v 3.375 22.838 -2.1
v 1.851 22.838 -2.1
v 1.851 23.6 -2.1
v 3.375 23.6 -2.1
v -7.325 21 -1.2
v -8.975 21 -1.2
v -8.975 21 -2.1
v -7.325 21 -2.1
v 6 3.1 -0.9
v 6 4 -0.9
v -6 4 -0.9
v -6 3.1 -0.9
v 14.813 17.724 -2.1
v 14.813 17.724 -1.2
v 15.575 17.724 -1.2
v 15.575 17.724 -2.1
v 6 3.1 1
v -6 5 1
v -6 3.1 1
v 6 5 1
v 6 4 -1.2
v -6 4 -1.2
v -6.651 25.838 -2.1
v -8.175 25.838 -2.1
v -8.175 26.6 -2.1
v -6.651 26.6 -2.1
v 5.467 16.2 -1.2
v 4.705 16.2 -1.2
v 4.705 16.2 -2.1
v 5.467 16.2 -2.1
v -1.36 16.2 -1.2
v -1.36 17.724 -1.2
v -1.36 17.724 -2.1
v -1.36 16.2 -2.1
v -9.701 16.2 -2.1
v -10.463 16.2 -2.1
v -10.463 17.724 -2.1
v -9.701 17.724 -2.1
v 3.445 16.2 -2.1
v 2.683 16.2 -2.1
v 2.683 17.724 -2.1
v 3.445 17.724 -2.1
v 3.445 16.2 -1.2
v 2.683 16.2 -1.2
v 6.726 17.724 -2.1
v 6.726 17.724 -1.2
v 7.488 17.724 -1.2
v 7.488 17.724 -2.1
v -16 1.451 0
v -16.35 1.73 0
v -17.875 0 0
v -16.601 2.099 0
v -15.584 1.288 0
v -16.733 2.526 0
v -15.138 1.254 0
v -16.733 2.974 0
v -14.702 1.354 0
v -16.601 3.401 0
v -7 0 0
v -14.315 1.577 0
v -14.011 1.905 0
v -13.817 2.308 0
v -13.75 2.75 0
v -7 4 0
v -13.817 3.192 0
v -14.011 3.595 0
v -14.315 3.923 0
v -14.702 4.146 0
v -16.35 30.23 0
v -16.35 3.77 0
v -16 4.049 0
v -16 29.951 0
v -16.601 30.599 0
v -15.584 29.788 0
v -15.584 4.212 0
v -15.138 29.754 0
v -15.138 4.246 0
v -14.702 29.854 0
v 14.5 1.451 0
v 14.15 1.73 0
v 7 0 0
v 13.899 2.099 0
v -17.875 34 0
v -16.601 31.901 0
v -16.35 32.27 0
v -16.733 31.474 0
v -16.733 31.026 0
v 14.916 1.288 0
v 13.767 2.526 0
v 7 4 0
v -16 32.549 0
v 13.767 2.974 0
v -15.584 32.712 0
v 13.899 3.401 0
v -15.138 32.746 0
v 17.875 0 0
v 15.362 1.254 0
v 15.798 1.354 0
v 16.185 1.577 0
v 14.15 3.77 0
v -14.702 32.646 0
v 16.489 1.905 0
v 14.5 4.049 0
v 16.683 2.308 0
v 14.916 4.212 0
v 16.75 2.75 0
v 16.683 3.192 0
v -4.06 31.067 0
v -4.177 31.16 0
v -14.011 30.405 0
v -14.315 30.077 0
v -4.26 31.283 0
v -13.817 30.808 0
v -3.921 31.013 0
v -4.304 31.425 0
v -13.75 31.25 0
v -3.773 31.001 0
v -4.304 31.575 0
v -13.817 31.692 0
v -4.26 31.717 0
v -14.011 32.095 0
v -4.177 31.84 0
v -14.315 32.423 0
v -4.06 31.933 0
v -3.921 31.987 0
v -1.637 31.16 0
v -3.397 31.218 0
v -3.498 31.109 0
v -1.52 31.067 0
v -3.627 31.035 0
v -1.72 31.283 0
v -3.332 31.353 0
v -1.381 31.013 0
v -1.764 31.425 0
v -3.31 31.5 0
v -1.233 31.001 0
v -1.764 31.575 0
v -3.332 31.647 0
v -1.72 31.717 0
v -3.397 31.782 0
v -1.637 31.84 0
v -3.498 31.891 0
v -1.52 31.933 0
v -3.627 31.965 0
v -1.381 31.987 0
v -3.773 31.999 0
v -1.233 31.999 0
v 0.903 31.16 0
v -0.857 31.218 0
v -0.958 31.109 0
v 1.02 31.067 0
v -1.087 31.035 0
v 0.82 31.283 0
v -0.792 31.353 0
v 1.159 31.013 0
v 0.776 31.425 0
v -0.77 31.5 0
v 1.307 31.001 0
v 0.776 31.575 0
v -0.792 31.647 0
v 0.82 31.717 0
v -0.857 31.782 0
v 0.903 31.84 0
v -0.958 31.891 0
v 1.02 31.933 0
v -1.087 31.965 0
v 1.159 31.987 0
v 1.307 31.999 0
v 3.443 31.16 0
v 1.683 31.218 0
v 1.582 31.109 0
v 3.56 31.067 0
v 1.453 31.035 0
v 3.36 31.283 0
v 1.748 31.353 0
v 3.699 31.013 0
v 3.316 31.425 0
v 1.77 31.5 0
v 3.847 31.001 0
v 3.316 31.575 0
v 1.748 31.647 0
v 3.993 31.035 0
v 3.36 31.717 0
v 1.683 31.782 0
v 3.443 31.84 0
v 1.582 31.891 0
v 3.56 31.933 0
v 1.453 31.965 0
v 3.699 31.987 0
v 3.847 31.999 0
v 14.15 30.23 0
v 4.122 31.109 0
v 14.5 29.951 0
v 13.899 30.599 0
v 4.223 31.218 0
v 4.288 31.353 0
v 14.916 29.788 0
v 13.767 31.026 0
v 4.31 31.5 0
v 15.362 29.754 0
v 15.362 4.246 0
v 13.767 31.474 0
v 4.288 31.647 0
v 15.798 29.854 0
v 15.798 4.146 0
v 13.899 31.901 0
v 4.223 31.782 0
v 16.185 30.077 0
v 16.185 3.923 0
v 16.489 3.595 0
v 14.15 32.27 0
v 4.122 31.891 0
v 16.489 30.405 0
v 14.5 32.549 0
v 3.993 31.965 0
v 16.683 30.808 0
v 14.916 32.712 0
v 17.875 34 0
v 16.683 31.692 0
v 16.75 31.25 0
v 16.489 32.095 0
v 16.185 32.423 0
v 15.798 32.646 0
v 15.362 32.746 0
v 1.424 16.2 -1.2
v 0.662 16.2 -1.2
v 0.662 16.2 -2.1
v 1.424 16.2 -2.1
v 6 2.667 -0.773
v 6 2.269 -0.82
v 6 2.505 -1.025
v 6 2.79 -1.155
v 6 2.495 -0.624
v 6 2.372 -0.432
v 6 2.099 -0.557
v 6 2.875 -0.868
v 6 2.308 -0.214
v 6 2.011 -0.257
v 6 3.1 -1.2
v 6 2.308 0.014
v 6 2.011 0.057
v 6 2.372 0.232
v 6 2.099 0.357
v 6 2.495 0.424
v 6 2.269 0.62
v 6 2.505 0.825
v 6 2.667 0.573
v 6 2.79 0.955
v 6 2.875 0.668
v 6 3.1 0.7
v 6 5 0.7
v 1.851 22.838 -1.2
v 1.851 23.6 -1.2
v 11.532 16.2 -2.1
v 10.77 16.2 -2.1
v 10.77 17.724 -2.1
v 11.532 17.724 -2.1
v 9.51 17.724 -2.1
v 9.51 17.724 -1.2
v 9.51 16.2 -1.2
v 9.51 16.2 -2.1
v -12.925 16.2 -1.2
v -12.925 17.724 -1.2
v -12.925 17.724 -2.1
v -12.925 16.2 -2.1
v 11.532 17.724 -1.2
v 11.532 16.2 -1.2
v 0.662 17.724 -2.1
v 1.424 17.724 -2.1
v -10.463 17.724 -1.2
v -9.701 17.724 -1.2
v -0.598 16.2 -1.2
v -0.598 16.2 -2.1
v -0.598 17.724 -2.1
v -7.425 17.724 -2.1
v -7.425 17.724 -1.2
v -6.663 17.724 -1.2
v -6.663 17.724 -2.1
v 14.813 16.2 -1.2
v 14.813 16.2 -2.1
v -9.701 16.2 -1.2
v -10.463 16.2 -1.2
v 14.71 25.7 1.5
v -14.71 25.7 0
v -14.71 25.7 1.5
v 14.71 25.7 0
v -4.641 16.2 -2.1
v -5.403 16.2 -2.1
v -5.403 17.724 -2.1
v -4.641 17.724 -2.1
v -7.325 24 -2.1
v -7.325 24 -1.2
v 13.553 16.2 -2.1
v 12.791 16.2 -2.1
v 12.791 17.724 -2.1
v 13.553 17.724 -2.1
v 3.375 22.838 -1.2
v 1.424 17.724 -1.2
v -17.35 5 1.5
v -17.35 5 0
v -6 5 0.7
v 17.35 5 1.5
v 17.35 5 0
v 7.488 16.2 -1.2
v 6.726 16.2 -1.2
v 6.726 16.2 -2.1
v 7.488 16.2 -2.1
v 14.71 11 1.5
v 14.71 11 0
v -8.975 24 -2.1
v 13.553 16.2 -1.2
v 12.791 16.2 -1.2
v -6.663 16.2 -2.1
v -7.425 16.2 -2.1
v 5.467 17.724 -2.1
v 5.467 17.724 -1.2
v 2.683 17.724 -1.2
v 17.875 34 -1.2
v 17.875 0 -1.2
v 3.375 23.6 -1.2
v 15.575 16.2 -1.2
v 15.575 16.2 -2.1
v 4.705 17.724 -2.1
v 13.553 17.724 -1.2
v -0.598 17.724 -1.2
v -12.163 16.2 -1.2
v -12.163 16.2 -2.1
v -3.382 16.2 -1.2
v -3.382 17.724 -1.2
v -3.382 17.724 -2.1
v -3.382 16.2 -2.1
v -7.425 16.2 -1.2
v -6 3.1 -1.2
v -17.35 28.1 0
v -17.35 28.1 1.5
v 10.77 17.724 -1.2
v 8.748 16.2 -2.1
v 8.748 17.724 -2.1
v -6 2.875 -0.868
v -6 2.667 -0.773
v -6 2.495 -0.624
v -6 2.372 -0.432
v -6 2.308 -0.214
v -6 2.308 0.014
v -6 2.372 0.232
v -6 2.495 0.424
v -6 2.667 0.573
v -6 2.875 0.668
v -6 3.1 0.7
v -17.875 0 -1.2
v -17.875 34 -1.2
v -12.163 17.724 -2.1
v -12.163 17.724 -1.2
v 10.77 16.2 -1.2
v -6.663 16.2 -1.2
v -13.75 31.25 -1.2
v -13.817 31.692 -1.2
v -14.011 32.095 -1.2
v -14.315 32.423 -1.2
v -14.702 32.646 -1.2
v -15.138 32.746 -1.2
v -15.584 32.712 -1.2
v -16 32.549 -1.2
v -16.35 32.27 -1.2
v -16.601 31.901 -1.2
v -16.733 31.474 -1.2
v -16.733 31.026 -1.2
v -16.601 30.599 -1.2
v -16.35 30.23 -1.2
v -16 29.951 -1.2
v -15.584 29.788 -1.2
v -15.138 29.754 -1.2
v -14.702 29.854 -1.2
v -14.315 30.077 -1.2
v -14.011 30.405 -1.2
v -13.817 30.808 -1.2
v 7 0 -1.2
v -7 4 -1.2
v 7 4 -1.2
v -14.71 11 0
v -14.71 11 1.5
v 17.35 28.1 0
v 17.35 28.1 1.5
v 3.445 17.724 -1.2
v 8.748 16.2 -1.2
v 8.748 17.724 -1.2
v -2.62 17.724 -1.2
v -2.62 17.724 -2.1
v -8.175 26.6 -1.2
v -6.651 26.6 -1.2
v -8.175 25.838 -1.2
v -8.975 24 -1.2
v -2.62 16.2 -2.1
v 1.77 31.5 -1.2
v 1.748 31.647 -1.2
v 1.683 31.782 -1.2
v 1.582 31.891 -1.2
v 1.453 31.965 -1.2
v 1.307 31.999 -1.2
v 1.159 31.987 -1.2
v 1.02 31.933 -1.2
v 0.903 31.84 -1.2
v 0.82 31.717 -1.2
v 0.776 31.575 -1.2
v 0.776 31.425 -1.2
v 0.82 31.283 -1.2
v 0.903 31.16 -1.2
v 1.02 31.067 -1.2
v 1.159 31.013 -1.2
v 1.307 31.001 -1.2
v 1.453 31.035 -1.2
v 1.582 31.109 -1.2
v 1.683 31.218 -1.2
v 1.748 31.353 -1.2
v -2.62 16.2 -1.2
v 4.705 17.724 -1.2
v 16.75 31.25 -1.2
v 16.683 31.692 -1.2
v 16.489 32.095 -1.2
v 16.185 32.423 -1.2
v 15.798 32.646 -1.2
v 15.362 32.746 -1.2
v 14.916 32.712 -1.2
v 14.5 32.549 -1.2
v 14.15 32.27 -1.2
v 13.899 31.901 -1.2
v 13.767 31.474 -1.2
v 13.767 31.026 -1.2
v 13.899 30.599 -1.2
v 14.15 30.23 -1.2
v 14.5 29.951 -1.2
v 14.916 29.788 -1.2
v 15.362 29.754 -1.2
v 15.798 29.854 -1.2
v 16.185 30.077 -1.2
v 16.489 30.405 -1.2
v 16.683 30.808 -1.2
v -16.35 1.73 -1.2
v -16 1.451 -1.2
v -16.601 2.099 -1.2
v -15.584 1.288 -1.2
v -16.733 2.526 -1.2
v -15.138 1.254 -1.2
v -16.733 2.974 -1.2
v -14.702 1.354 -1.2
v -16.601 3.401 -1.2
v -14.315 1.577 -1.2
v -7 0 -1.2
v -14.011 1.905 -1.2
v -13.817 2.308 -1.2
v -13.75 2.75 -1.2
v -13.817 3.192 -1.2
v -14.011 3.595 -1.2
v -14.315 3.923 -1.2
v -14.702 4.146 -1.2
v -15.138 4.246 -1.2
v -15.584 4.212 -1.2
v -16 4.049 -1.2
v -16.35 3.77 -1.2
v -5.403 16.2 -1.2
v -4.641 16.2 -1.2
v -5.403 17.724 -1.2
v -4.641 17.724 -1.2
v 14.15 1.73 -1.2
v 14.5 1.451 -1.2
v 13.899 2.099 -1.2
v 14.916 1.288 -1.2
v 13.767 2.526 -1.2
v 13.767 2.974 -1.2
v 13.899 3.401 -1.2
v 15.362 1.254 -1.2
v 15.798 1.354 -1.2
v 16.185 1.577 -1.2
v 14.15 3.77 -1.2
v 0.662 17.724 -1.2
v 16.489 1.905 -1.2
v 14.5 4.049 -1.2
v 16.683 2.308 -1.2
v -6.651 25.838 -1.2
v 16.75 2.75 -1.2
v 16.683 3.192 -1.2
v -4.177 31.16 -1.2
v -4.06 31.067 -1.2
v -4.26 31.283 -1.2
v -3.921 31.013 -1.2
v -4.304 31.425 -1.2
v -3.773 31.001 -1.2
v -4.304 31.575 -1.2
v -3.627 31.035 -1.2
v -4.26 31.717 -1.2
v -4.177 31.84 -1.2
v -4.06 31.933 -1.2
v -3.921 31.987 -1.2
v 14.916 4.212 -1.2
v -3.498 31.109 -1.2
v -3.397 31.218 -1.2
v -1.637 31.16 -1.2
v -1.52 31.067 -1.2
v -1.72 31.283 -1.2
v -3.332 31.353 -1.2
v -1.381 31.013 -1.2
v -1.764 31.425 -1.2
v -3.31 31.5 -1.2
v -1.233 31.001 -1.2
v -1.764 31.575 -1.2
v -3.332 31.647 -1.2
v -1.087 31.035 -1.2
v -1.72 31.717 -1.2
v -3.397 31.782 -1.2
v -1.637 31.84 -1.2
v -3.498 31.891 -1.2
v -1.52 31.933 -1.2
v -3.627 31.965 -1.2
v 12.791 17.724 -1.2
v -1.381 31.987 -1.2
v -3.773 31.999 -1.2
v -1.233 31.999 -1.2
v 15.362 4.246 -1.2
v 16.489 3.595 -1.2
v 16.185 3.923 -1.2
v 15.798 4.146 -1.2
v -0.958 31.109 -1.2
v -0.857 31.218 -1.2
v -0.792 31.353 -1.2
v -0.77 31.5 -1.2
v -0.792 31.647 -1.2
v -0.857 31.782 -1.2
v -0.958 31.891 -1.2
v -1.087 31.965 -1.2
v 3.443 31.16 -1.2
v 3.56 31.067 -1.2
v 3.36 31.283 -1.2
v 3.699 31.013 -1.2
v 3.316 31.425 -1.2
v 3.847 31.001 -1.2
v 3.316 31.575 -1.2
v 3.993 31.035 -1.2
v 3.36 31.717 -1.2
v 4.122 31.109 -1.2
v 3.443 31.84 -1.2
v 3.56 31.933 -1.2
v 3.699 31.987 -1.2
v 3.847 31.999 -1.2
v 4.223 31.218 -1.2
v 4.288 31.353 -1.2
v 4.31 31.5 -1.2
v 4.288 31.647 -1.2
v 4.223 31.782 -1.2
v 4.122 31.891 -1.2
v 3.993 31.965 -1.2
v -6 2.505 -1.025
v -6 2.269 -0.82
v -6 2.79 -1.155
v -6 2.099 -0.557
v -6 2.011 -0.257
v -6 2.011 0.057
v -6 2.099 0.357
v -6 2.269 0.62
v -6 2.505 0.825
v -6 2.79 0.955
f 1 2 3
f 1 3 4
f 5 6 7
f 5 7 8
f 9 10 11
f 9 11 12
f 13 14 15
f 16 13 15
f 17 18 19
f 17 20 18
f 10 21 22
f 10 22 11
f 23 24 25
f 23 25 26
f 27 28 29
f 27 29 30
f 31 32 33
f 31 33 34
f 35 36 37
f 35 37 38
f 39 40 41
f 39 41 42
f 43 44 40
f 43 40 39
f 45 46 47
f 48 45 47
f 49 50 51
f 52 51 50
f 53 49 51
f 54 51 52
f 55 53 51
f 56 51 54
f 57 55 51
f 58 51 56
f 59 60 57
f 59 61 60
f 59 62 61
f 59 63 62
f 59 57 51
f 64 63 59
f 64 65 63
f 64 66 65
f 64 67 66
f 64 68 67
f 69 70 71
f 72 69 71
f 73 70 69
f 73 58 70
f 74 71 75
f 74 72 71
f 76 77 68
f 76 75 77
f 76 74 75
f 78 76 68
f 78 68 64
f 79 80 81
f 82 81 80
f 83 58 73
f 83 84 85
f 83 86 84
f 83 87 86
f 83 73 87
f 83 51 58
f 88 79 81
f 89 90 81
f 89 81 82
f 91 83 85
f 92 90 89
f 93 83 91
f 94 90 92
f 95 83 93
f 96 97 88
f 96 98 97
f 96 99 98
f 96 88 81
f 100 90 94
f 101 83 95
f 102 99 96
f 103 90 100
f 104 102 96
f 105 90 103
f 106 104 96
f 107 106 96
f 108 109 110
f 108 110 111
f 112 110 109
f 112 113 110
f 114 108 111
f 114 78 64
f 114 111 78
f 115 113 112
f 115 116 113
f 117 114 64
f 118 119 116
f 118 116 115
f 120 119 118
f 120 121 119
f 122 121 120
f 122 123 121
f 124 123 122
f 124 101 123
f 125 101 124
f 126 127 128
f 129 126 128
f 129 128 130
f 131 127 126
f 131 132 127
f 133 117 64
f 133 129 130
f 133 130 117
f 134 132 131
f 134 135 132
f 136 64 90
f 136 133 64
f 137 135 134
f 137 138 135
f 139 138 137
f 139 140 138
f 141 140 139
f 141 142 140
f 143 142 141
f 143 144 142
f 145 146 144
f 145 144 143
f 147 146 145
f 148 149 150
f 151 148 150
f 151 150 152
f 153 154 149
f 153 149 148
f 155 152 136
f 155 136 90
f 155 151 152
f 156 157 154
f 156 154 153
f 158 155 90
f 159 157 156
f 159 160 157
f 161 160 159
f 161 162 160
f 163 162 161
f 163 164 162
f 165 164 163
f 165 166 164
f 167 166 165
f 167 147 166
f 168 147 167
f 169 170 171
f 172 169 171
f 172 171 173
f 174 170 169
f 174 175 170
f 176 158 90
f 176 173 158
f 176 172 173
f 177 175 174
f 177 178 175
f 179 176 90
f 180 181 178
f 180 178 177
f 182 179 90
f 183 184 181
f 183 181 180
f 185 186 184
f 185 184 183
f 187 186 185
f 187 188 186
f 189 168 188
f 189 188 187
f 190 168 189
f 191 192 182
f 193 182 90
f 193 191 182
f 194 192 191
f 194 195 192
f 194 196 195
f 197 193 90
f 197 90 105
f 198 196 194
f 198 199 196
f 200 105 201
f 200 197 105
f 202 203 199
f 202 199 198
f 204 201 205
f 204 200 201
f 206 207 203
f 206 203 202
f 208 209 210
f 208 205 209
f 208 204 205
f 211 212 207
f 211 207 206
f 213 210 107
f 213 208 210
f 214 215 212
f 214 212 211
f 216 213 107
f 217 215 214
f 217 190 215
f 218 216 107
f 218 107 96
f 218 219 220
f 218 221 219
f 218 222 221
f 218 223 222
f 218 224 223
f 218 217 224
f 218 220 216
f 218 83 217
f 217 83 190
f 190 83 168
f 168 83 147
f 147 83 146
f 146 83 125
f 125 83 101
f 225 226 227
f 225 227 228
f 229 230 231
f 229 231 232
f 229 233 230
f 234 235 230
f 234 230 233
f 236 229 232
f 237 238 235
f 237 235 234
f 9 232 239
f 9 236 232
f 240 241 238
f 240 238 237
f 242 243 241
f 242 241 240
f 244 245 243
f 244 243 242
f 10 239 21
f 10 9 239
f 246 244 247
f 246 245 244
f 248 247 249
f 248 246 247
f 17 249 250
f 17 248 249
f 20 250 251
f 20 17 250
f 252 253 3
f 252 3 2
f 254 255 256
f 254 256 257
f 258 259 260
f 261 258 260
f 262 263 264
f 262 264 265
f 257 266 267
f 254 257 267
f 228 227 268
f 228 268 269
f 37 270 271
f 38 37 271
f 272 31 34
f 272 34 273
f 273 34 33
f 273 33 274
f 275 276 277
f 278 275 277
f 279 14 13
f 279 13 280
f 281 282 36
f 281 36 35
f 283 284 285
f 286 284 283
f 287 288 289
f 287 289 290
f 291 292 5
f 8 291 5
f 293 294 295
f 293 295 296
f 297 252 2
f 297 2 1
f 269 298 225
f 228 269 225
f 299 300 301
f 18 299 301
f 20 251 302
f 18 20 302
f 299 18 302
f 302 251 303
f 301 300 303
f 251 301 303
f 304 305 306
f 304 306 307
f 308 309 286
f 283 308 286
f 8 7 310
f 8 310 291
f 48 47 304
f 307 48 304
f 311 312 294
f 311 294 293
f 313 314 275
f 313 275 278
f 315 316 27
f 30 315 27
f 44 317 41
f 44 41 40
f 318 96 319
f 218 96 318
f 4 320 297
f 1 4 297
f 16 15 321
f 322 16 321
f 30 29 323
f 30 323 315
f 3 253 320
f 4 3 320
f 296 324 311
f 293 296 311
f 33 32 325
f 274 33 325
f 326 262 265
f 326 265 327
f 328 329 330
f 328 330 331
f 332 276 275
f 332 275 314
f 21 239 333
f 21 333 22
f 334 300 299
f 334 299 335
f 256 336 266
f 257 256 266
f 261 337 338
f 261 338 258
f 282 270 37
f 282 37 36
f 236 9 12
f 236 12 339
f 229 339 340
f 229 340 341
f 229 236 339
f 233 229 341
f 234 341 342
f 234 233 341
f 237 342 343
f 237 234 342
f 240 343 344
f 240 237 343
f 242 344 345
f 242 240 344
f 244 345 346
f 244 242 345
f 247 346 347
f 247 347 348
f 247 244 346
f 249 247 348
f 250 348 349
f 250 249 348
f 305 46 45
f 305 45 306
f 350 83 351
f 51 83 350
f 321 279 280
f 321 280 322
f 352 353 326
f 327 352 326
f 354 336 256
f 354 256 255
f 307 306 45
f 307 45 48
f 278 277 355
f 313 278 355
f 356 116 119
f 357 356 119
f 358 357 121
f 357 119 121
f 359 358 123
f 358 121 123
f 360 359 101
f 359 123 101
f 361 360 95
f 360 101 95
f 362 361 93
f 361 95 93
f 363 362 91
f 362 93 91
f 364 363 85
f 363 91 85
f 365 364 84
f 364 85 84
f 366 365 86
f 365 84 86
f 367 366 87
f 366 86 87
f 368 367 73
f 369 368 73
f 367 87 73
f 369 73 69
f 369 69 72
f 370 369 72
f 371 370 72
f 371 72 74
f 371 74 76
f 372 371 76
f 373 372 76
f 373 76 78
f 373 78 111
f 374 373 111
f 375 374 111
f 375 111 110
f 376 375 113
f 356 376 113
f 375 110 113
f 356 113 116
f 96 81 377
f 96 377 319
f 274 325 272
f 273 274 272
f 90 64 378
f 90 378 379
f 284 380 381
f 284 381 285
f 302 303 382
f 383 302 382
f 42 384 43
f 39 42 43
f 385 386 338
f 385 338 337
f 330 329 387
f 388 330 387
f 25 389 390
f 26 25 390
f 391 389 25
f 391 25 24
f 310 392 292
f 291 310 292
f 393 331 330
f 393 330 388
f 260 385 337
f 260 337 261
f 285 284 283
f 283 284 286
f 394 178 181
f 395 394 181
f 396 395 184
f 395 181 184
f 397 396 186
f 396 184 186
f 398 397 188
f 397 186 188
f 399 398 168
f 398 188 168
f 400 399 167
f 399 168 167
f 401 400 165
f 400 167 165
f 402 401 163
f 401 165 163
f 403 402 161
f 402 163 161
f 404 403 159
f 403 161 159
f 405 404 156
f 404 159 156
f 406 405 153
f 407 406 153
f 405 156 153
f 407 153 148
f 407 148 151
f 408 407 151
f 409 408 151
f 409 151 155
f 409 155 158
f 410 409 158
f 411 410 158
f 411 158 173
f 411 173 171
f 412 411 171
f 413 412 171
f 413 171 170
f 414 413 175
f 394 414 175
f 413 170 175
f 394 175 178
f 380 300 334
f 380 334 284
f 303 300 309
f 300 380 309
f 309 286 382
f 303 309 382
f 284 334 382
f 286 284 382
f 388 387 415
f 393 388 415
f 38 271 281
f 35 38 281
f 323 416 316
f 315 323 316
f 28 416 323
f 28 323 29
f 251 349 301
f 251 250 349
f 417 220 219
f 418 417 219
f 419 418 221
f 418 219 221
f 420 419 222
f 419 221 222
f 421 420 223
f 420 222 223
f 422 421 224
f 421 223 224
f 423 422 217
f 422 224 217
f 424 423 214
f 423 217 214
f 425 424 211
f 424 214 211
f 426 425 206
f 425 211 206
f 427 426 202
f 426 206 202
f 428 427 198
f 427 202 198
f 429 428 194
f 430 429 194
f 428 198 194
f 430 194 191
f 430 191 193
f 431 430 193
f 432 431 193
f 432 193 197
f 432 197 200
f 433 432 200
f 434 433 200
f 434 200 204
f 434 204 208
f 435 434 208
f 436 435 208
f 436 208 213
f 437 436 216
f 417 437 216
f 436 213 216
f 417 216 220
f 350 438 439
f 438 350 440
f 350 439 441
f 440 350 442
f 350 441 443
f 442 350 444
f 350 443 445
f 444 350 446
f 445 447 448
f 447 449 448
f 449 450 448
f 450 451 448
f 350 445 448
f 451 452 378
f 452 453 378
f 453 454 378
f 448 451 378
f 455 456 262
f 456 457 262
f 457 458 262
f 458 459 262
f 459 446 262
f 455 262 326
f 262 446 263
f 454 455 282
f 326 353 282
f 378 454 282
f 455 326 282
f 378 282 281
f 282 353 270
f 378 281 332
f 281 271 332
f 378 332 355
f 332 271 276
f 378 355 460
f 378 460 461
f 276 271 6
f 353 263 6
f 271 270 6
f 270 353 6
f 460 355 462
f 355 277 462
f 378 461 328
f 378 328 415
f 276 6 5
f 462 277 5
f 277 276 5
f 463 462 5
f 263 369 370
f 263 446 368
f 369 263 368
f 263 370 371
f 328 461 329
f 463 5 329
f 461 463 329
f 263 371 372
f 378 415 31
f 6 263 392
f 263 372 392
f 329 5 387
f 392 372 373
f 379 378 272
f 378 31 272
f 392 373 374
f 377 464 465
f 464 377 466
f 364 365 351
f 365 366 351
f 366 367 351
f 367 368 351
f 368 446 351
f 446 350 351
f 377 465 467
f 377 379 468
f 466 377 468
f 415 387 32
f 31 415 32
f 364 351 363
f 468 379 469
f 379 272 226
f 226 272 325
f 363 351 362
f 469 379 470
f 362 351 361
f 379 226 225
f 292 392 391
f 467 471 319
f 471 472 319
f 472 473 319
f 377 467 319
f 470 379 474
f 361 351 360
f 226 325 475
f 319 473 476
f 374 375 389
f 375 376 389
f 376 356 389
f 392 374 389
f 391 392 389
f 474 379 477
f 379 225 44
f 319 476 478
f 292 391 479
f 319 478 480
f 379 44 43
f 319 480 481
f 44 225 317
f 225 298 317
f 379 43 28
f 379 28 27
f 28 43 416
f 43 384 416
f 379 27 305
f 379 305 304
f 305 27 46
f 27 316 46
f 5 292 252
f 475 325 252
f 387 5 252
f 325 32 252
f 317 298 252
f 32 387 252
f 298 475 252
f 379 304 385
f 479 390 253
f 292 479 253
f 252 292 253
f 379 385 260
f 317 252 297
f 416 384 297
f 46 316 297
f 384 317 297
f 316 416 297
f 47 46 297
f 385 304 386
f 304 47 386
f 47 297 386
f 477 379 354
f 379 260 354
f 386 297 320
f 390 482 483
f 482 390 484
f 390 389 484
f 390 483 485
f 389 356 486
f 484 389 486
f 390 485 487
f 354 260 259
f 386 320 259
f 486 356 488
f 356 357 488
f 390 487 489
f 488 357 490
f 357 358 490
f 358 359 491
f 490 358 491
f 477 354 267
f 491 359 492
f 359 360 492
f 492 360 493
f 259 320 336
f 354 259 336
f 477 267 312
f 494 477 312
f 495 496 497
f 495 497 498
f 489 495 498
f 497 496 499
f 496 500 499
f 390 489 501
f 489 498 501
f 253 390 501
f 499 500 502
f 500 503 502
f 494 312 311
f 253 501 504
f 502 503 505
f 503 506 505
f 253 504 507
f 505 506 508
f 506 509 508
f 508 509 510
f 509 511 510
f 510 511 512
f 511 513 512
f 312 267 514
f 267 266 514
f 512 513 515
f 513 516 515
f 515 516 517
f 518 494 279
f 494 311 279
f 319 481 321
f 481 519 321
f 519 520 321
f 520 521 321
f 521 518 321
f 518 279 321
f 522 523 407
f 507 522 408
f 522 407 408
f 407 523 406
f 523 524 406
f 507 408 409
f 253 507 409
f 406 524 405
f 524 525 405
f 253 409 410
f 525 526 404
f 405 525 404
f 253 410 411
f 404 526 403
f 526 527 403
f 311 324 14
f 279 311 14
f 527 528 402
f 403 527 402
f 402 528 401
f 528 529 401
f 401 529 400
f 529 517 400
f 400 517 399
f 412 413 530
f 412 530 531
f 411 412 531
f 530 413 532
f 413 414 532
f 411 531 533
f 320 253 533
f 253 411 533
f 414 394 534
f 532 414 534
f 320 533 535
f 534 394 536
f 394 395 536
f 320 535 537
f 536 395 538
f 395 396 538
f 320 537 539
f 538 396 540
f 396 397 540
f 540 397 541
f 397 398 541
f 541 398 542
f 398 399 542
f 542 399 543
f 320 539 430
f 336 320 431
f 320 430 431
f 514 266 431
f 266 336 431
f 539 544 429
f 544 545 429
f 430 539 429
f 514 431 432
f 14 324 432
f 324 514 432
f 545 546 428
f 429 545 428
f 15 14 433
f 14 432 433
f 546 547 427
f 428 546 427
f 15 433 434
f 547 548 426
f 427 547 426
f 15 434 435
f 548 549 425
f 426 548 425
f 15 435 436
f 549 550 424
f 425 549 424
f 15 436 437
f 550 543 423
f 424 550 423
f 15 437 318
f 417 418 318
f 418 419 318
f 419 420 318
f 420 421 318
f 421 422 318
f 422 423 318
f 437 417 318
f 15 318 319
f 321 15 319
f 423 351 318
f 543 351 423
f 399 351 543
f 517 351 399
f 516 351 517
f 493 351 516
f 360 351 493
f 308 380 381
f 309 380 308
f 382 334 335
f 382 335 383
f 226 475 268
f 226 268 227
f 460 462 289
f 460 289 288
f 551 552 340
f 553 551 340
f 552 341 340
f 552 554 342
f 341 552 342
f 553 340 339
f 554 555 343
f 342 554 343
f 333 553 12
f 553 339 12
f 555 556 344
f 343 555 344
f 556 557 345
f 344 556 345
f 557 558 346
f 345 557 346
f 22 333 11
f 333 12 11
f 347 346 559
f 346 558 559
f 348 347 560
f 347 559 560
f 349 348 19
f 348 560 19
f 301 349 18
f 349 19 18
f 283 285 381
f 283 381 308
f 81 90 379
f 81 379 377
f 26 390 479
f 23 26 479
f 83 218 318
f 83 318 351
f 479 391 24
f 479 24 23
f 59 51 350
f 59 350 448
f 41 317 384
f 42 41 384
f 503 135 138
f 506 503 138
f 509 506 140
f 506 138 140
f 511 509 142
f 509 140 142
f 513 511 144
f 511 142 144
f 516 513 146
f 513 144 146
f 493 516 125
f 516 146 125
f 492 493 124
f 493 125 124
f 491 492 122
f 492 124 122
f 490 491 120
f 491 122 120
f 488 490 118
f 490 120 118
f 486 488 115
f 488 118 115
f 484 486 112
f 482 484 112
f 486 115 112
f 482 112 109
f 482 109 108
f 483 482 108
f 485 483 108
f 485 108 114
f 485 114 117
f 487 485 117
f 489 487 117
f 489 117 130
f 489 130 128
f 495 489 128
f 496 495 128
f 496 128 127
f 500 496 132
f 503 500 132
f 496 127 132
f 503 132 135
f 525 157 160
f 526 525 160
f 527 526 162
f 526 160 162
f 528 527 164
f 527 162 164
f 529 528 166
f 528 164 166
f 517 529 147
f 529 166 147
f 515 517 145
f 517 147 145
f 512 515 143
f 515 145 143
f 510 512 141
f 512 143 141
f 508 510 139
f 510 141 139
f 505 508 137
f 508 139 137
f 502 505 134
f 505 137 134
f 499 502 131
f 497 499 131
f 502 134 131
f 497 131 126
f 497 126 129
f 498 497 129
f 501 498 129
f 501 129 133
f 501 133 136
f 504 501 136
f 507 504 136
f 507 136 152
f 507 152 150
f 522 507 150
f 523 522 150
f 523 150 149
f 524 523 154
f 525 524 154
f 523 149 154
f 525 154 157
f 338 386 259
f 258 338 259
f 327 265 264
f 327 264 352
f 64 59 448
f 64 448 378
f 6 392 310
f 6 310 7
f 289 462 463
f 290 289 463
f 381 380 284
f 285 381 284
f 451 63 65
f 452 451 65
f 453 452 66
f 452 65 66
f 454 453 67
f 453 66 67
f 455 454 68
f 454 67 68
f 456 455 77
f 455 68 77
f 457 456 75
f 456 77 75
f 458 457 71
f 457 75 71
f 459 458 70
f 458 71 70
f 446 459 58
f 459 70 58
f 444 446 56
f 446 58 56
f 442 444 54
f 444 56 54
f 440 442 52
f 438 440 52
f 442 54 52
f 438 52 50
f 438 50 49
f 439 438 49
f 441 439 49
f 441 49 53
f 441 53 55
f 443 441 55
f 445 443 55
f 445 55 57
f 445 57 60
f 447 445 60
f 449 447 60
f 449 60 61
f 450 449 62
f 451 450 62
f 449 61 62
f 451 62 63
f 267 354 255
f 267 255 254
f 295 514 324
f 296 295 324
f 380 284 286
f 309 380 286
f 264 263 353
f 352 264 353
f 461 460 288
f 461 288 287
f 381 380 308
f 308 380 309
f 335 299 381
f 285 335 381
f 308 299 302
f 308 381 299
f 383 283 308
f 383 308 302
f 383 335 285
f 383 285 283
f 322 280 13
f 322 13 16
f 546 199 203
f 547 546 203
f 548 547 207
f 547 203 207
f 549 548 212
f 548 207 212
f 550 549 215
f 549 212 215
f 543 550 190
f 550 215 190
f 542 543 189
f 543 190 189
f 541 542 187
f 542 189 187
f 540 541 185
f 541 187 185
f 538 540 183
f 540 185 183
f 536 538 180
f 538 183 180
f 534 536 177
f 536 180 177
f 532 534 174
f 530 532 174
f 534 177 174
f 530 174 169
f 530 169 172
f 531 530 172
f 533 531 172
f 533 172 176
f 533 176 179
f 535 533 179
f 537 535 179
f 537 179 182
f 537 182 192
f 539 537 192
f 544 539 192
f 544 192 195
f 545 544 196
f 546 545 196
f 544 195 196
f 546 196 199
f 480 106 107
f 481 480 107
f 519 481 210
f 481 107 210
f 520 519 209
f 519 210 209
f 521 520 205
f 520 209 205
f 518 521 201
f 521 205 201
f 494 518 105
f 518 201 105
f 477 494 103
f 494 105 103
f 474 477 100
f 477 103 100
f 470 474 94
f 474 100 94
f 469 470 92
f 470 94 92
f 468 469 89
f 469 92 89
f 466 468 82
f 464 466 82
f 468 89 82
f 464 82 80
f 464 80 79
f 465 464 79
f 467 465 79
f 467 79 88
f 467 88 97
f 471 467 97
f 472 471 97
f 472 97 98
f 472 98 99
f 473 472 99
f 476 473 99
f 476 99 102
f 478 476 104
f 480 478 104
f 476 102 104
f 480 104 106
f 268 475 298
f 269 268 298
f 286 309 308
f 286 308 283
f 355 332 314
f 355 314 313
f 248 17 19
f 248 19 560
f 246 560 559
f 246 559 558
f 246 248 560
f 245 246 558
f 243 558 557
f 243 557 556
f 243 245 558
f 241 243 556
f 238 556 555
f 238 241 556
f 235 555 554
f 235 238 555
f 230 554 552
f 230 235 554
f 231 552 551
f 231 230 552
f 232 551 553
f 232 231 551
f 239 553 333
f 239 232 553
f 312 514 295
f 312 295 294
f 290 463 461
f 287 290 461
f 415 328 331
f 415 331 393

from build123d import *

# Parameters (mm, degrees)
F0_R     = 1.5
F0_R_2   = 0.5
F1_DEPTH = 1.2
F2_W     = 34.7
F2_H     = 23.1
F2_W_2   = 29.42
F2_H_2   = 14.7
F3_DEPTH = 1.5
F4_DEPTH = 1.5
F6_DEPTH = 6
F7_W     = 0.762
F7_H     = 1.524
F7_W_2   = 1.65
F7_H_2   = 3
F7_W_3   = 1.524
F7_H_3   = 0.762
F8_DEPTH = 0.9


with BuildPart() as f1:
    # F0 (on Top) → F1 (new body)
    with BuildSketch(Plane.XY):
        Polygon((17.875, 0), (17.875, 34), (-17.875, 34), (-17.875, 0), (-7, 0), (-7, 4), (7, 4), (7, 0), align=None)
        with Locations((-15.25, 2.75)):
            Circle(F0_R, mode=Mode.SUBTRACT)
        with Locations((15.25, 2.75)):
            Circle(F0_R, mode=Mode.SUBTRACT)
        with Locations((-15.25, 31.25)):
            Circle(F0_R, mode=Mode.SUBTRACT)
        with Locations((-3.81, 31.5)):
            Circle(F0_R_2, mode=Mode.SUBTRACT)
        with Locations((-1.27, 31.5)):
            Circle(F0_R_2, mode=Mode.SUBTRACT)
        with Locations((1.27, 31.5)):
            Circle(F0_R_2, mode=Mode.SUBTRACT)
        with Locations((3.81, 31.5)):
            Circle(F0_R_2, mode=Mode.SUBTRACT)
        with Locations((15.25, 31.25)):
            Circle(F0_R, mode=Mode.SUBTRACT)
    extrude(amount=-F1_DEPTH)

    # F7 (on face) → F8 (join)
    with BuildSketch(Plane(origin=(0, 0, -1.2), x_dir=(1, 0, 0), z_dir=(0, 0, -1))):
        with Locations((15.194, -16.962)):
            Rectangle(F7_W, F7_H)
        with Locations((13.1723636364, -16.962)):
            Rectangle(F7_W, F7_H)
        with Locations((11.1507272727, -16.962)):
            Rectangle(F7_W, F7_H)
        with Locations((9.1290909091, -16.962)):
            Rectangle(F7_W, F7_H)
        with Locations((7.1074545455, -16.962)):
            Rectangle(F7_W, F7_H)
        with Locations((5.0858181818, -16.962)):
            Rectangle(F7_W, F7_H)
        with Locations((3.0641818182, -16.962)):
            Rectangle(F7_W, F7_H)
        with Locations((1.0425454545, -16.962)):
            Rectangle(F7_W, F7_H)
        with Locations((-0.9790909091, -16.962)):
            Rectangle(F7_W, F7_H)
        with Locations((-3.0007272727, -16.962)):
            Rectangle(F7_W, F7_H)
        with Locations((-5.0223636364, -16.962)):
            Rectangle(F7_W, F7_H)
        with Locations((-7.044, -16.962)):
            Rectangle(F7_W, F7_H)
        with Locations((-10.082, -16.962)):
            Rectangle(F7_W, F7_H)
        with Locations((-12.544, -16.962)):
            Rectangle(F7_W, F7_H)
        with Locations((-8.15, -22.5)):
            Rectangle(F7_W_2, F7_H_2)
        with Locations((-7.413, -26.219)):
            Rectangle(F7_W_3, F7_H_3)
        with Locations((2.613, -23.219)):
            Rectangle(F7_W_3, F7_H_3)
    extrude(amount=F8_DEPTH)


with BuildPart() as f3:
    # F2 (on Top) → F3 (new body)
    with BuildSketch(Plane.XY):
        with Locations((0, 16.55)):
            Rectangle(F2_W, F2_H)
        with Locations((0, 18.35)):
            Rectangle(F2_W_2, F2_H_2, mode=Mode.SUBTRACT)
    extrude(amount=F3_DEPTH)

    # F5 (on Right) → F6 (join, symmetric)
    with BuildSketch(Plane.YZ):
        with BuildLine():
            Line((5, 1), (3.1, 1))
            ThreePointArc((3.1, 1), (2, -0.1), (3.1, -1.2))
            Line((3.1, -1.2), (4, -1.2))
            Line((4, -1.2), (4, -0.9))
            Line((4, -0.9), (3.1, -0.9))
            ThreePointArc((3.1, -0.9), (2.3, -0.1), (3.1, 0.7))
            Line((3.1, 0.7), (5, 0.7))
            Line((5, 0.7), (5, 1))
        make_face()
    extrude(amount=F6_DEPTH, both=True)


with BuildPart() as f4:
    # F2 (on Top) → F4 (new body, through all)
    with BuildSketch(Plane.XY):
        with Locations((0, 18.35)):
            Rectangle(F2_W_2, F2_H_2)
    extrude(amount=F4_DEPTH)


solid = Compound([f1.part, f3.part, f4.part])
